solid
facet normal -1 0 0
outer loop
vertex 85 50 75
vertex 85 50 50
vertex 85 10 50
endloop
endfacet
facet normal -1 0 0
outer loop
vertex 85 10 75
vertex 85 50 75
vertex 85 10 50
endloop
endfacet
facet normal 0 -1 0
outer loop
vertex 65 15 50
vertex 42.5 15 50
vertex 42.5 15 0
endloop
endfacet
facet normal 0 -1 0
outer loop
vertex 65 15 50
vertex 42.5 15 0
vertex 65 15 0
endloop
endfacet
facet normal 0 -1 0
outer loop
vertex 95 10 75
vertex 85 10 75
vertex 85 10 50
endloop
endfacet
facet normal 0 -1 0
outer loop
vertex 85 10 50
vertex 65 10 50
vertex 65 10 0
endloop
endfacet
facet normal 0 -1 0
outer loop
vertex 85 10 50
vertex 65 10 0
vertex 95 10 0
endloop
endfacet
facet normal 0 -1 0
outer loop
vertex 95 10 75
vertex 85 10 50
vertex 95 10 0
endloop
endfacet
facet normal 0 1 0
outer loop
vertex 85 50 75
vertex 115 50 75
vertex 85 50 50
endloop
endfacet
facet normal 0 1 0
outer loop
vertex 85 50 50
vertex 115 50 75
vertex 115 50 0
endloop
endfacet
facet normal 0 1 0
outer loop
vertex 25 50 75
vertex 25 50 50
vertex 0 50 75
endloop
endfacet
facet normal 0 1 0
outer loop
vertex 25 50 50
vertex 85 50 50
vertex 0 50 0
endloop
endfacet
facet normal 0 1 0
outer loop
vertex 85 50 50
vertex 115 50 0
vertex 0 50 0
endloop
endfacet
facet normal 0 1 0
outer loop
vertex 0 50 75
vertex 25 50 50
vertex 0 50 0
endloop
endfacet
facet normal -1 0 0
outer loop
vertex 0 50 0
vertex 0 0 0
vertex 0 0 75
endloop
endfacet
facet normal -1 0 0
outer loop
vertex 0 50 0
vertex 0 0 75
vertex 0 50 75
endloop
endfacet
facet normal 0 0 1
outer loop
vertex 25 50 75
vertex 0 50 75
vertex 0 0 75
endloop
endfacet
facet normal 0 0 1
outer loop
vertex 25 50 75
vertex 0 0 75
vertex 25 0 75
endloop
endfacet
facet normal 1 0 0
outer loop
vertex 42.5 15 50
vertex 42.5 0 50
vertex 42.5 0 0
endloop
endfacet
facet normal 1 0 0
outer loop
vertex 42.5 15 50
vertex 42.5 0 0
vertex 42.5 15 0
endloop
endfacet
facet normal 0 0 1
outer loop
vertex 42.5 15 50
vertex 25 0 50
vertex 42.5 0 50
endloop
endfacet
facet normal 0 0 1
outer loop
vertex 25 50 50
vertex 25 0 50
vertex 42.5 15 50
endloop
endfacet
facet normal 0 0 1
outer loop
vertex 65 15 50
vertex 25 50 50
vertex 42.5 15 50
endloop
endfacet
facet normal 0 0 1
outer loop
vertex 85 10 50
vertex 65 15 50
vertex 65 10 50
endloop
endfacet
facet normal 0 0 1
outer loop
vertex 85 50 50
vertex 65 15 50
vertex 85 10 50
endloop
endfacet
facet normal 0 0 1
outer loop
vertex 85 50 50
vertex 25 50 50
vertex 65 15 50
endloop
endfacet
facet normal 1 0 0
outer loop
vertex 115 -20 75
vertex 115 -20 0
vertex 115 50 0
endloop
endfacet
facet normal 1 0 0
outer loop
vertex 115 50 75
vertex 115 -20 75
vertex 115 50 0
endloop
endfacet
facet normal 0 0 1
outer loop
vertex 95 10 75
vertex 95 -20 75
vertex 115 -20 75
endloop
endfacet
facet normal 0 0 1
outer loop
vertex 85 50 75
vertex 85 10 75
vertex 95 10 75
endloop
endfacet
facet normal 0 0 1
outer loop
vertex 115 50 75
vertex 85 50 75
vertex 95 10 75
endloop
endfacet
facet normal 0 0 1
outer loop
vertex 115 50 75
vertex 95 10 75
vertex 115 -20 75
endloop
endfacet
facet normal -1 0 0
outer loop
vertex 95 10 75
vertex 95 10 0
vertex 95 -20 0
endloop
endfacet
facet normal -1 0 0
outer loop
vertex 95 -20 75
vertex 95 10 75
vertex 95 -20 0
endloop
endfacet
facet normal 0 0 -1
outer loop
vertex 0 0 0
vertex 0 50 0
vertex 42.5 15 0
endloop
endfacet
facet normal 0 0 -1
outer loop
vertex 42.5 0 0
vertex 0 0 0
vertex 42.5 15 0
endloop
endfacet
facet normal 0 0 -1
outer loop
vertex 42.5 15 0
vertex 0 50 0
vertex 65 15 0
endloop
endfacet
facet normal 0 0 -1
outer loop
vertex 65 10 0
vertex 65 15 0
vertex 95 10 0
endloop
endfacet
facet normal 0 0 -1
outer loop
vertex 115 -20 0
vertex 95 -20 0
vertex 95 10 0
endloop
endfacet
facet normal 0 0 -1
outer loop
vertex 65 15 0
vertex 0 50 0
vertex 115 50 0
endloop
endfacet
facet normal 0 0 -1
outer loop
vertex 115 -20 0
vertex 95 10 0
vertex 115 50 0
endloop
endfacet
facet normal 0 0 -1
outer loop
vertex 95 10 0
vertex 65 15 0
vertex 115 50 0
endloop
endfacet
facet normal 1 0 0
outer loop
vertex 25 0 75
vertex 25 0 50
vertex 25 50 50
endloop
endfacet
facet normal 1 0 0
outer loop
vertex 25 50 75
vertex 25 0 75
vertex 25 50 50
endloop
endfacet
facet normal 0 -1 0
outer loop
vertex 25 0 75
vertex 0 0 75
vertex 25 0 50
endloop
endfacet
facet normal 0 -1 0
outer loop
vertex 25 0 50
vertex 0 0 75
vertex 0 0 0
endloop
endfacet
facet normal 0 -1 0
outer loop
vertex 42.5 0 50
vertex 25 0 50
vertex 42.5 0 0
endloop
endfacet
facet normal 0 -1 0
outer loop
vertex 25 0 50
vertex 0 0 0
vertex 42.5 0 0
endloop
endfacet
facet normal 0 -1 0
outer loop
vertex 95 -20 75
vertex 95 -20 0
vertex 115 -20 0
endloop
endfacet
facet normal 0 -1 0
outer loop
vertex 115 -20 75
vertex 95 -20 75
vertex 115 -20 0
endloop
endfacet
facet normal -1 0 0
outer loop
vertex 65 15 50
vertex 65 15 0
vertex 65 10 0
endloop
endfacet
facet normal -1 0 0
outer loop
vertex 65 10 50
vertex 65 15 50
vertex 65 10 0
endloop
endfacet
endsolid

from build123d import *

# Parameters (mm, degrees)
F0_W     = 25
F0_H     = 50
F1_DEPTH = 75
F2_DEPTH = 50
F3_DEPTH = 75


with BuildPart() as f1:
    # F0 (on Top) → F1 (new body)
    with BuildSketch(Plane.XY):
        with Locations((12.5, 25)):
            Rectangle(F0_W, F0_H)
    extrude(amount=F1_DEPTH)

    # F0 (on Top) → F2 (join)
    with BuildSketch(Plane.XY):
        Polygon((25, 50), (25, 0), (42.5, 0), (42.5, 15), (65, 15), (65, 10), (85, 10), (85, 50), align=None)
    extrude(amount=F2_DEPTH)

    # F0 (on Top) → F3 (join)
    with BuildSketch(Plane.XY):
        Polygon((115, 50), (85, 50), (85, 10), (95, 10), (95, -20), (115, -20), align=None)
    extrude(amount=F3_DEPTH)


solid = f1.part
